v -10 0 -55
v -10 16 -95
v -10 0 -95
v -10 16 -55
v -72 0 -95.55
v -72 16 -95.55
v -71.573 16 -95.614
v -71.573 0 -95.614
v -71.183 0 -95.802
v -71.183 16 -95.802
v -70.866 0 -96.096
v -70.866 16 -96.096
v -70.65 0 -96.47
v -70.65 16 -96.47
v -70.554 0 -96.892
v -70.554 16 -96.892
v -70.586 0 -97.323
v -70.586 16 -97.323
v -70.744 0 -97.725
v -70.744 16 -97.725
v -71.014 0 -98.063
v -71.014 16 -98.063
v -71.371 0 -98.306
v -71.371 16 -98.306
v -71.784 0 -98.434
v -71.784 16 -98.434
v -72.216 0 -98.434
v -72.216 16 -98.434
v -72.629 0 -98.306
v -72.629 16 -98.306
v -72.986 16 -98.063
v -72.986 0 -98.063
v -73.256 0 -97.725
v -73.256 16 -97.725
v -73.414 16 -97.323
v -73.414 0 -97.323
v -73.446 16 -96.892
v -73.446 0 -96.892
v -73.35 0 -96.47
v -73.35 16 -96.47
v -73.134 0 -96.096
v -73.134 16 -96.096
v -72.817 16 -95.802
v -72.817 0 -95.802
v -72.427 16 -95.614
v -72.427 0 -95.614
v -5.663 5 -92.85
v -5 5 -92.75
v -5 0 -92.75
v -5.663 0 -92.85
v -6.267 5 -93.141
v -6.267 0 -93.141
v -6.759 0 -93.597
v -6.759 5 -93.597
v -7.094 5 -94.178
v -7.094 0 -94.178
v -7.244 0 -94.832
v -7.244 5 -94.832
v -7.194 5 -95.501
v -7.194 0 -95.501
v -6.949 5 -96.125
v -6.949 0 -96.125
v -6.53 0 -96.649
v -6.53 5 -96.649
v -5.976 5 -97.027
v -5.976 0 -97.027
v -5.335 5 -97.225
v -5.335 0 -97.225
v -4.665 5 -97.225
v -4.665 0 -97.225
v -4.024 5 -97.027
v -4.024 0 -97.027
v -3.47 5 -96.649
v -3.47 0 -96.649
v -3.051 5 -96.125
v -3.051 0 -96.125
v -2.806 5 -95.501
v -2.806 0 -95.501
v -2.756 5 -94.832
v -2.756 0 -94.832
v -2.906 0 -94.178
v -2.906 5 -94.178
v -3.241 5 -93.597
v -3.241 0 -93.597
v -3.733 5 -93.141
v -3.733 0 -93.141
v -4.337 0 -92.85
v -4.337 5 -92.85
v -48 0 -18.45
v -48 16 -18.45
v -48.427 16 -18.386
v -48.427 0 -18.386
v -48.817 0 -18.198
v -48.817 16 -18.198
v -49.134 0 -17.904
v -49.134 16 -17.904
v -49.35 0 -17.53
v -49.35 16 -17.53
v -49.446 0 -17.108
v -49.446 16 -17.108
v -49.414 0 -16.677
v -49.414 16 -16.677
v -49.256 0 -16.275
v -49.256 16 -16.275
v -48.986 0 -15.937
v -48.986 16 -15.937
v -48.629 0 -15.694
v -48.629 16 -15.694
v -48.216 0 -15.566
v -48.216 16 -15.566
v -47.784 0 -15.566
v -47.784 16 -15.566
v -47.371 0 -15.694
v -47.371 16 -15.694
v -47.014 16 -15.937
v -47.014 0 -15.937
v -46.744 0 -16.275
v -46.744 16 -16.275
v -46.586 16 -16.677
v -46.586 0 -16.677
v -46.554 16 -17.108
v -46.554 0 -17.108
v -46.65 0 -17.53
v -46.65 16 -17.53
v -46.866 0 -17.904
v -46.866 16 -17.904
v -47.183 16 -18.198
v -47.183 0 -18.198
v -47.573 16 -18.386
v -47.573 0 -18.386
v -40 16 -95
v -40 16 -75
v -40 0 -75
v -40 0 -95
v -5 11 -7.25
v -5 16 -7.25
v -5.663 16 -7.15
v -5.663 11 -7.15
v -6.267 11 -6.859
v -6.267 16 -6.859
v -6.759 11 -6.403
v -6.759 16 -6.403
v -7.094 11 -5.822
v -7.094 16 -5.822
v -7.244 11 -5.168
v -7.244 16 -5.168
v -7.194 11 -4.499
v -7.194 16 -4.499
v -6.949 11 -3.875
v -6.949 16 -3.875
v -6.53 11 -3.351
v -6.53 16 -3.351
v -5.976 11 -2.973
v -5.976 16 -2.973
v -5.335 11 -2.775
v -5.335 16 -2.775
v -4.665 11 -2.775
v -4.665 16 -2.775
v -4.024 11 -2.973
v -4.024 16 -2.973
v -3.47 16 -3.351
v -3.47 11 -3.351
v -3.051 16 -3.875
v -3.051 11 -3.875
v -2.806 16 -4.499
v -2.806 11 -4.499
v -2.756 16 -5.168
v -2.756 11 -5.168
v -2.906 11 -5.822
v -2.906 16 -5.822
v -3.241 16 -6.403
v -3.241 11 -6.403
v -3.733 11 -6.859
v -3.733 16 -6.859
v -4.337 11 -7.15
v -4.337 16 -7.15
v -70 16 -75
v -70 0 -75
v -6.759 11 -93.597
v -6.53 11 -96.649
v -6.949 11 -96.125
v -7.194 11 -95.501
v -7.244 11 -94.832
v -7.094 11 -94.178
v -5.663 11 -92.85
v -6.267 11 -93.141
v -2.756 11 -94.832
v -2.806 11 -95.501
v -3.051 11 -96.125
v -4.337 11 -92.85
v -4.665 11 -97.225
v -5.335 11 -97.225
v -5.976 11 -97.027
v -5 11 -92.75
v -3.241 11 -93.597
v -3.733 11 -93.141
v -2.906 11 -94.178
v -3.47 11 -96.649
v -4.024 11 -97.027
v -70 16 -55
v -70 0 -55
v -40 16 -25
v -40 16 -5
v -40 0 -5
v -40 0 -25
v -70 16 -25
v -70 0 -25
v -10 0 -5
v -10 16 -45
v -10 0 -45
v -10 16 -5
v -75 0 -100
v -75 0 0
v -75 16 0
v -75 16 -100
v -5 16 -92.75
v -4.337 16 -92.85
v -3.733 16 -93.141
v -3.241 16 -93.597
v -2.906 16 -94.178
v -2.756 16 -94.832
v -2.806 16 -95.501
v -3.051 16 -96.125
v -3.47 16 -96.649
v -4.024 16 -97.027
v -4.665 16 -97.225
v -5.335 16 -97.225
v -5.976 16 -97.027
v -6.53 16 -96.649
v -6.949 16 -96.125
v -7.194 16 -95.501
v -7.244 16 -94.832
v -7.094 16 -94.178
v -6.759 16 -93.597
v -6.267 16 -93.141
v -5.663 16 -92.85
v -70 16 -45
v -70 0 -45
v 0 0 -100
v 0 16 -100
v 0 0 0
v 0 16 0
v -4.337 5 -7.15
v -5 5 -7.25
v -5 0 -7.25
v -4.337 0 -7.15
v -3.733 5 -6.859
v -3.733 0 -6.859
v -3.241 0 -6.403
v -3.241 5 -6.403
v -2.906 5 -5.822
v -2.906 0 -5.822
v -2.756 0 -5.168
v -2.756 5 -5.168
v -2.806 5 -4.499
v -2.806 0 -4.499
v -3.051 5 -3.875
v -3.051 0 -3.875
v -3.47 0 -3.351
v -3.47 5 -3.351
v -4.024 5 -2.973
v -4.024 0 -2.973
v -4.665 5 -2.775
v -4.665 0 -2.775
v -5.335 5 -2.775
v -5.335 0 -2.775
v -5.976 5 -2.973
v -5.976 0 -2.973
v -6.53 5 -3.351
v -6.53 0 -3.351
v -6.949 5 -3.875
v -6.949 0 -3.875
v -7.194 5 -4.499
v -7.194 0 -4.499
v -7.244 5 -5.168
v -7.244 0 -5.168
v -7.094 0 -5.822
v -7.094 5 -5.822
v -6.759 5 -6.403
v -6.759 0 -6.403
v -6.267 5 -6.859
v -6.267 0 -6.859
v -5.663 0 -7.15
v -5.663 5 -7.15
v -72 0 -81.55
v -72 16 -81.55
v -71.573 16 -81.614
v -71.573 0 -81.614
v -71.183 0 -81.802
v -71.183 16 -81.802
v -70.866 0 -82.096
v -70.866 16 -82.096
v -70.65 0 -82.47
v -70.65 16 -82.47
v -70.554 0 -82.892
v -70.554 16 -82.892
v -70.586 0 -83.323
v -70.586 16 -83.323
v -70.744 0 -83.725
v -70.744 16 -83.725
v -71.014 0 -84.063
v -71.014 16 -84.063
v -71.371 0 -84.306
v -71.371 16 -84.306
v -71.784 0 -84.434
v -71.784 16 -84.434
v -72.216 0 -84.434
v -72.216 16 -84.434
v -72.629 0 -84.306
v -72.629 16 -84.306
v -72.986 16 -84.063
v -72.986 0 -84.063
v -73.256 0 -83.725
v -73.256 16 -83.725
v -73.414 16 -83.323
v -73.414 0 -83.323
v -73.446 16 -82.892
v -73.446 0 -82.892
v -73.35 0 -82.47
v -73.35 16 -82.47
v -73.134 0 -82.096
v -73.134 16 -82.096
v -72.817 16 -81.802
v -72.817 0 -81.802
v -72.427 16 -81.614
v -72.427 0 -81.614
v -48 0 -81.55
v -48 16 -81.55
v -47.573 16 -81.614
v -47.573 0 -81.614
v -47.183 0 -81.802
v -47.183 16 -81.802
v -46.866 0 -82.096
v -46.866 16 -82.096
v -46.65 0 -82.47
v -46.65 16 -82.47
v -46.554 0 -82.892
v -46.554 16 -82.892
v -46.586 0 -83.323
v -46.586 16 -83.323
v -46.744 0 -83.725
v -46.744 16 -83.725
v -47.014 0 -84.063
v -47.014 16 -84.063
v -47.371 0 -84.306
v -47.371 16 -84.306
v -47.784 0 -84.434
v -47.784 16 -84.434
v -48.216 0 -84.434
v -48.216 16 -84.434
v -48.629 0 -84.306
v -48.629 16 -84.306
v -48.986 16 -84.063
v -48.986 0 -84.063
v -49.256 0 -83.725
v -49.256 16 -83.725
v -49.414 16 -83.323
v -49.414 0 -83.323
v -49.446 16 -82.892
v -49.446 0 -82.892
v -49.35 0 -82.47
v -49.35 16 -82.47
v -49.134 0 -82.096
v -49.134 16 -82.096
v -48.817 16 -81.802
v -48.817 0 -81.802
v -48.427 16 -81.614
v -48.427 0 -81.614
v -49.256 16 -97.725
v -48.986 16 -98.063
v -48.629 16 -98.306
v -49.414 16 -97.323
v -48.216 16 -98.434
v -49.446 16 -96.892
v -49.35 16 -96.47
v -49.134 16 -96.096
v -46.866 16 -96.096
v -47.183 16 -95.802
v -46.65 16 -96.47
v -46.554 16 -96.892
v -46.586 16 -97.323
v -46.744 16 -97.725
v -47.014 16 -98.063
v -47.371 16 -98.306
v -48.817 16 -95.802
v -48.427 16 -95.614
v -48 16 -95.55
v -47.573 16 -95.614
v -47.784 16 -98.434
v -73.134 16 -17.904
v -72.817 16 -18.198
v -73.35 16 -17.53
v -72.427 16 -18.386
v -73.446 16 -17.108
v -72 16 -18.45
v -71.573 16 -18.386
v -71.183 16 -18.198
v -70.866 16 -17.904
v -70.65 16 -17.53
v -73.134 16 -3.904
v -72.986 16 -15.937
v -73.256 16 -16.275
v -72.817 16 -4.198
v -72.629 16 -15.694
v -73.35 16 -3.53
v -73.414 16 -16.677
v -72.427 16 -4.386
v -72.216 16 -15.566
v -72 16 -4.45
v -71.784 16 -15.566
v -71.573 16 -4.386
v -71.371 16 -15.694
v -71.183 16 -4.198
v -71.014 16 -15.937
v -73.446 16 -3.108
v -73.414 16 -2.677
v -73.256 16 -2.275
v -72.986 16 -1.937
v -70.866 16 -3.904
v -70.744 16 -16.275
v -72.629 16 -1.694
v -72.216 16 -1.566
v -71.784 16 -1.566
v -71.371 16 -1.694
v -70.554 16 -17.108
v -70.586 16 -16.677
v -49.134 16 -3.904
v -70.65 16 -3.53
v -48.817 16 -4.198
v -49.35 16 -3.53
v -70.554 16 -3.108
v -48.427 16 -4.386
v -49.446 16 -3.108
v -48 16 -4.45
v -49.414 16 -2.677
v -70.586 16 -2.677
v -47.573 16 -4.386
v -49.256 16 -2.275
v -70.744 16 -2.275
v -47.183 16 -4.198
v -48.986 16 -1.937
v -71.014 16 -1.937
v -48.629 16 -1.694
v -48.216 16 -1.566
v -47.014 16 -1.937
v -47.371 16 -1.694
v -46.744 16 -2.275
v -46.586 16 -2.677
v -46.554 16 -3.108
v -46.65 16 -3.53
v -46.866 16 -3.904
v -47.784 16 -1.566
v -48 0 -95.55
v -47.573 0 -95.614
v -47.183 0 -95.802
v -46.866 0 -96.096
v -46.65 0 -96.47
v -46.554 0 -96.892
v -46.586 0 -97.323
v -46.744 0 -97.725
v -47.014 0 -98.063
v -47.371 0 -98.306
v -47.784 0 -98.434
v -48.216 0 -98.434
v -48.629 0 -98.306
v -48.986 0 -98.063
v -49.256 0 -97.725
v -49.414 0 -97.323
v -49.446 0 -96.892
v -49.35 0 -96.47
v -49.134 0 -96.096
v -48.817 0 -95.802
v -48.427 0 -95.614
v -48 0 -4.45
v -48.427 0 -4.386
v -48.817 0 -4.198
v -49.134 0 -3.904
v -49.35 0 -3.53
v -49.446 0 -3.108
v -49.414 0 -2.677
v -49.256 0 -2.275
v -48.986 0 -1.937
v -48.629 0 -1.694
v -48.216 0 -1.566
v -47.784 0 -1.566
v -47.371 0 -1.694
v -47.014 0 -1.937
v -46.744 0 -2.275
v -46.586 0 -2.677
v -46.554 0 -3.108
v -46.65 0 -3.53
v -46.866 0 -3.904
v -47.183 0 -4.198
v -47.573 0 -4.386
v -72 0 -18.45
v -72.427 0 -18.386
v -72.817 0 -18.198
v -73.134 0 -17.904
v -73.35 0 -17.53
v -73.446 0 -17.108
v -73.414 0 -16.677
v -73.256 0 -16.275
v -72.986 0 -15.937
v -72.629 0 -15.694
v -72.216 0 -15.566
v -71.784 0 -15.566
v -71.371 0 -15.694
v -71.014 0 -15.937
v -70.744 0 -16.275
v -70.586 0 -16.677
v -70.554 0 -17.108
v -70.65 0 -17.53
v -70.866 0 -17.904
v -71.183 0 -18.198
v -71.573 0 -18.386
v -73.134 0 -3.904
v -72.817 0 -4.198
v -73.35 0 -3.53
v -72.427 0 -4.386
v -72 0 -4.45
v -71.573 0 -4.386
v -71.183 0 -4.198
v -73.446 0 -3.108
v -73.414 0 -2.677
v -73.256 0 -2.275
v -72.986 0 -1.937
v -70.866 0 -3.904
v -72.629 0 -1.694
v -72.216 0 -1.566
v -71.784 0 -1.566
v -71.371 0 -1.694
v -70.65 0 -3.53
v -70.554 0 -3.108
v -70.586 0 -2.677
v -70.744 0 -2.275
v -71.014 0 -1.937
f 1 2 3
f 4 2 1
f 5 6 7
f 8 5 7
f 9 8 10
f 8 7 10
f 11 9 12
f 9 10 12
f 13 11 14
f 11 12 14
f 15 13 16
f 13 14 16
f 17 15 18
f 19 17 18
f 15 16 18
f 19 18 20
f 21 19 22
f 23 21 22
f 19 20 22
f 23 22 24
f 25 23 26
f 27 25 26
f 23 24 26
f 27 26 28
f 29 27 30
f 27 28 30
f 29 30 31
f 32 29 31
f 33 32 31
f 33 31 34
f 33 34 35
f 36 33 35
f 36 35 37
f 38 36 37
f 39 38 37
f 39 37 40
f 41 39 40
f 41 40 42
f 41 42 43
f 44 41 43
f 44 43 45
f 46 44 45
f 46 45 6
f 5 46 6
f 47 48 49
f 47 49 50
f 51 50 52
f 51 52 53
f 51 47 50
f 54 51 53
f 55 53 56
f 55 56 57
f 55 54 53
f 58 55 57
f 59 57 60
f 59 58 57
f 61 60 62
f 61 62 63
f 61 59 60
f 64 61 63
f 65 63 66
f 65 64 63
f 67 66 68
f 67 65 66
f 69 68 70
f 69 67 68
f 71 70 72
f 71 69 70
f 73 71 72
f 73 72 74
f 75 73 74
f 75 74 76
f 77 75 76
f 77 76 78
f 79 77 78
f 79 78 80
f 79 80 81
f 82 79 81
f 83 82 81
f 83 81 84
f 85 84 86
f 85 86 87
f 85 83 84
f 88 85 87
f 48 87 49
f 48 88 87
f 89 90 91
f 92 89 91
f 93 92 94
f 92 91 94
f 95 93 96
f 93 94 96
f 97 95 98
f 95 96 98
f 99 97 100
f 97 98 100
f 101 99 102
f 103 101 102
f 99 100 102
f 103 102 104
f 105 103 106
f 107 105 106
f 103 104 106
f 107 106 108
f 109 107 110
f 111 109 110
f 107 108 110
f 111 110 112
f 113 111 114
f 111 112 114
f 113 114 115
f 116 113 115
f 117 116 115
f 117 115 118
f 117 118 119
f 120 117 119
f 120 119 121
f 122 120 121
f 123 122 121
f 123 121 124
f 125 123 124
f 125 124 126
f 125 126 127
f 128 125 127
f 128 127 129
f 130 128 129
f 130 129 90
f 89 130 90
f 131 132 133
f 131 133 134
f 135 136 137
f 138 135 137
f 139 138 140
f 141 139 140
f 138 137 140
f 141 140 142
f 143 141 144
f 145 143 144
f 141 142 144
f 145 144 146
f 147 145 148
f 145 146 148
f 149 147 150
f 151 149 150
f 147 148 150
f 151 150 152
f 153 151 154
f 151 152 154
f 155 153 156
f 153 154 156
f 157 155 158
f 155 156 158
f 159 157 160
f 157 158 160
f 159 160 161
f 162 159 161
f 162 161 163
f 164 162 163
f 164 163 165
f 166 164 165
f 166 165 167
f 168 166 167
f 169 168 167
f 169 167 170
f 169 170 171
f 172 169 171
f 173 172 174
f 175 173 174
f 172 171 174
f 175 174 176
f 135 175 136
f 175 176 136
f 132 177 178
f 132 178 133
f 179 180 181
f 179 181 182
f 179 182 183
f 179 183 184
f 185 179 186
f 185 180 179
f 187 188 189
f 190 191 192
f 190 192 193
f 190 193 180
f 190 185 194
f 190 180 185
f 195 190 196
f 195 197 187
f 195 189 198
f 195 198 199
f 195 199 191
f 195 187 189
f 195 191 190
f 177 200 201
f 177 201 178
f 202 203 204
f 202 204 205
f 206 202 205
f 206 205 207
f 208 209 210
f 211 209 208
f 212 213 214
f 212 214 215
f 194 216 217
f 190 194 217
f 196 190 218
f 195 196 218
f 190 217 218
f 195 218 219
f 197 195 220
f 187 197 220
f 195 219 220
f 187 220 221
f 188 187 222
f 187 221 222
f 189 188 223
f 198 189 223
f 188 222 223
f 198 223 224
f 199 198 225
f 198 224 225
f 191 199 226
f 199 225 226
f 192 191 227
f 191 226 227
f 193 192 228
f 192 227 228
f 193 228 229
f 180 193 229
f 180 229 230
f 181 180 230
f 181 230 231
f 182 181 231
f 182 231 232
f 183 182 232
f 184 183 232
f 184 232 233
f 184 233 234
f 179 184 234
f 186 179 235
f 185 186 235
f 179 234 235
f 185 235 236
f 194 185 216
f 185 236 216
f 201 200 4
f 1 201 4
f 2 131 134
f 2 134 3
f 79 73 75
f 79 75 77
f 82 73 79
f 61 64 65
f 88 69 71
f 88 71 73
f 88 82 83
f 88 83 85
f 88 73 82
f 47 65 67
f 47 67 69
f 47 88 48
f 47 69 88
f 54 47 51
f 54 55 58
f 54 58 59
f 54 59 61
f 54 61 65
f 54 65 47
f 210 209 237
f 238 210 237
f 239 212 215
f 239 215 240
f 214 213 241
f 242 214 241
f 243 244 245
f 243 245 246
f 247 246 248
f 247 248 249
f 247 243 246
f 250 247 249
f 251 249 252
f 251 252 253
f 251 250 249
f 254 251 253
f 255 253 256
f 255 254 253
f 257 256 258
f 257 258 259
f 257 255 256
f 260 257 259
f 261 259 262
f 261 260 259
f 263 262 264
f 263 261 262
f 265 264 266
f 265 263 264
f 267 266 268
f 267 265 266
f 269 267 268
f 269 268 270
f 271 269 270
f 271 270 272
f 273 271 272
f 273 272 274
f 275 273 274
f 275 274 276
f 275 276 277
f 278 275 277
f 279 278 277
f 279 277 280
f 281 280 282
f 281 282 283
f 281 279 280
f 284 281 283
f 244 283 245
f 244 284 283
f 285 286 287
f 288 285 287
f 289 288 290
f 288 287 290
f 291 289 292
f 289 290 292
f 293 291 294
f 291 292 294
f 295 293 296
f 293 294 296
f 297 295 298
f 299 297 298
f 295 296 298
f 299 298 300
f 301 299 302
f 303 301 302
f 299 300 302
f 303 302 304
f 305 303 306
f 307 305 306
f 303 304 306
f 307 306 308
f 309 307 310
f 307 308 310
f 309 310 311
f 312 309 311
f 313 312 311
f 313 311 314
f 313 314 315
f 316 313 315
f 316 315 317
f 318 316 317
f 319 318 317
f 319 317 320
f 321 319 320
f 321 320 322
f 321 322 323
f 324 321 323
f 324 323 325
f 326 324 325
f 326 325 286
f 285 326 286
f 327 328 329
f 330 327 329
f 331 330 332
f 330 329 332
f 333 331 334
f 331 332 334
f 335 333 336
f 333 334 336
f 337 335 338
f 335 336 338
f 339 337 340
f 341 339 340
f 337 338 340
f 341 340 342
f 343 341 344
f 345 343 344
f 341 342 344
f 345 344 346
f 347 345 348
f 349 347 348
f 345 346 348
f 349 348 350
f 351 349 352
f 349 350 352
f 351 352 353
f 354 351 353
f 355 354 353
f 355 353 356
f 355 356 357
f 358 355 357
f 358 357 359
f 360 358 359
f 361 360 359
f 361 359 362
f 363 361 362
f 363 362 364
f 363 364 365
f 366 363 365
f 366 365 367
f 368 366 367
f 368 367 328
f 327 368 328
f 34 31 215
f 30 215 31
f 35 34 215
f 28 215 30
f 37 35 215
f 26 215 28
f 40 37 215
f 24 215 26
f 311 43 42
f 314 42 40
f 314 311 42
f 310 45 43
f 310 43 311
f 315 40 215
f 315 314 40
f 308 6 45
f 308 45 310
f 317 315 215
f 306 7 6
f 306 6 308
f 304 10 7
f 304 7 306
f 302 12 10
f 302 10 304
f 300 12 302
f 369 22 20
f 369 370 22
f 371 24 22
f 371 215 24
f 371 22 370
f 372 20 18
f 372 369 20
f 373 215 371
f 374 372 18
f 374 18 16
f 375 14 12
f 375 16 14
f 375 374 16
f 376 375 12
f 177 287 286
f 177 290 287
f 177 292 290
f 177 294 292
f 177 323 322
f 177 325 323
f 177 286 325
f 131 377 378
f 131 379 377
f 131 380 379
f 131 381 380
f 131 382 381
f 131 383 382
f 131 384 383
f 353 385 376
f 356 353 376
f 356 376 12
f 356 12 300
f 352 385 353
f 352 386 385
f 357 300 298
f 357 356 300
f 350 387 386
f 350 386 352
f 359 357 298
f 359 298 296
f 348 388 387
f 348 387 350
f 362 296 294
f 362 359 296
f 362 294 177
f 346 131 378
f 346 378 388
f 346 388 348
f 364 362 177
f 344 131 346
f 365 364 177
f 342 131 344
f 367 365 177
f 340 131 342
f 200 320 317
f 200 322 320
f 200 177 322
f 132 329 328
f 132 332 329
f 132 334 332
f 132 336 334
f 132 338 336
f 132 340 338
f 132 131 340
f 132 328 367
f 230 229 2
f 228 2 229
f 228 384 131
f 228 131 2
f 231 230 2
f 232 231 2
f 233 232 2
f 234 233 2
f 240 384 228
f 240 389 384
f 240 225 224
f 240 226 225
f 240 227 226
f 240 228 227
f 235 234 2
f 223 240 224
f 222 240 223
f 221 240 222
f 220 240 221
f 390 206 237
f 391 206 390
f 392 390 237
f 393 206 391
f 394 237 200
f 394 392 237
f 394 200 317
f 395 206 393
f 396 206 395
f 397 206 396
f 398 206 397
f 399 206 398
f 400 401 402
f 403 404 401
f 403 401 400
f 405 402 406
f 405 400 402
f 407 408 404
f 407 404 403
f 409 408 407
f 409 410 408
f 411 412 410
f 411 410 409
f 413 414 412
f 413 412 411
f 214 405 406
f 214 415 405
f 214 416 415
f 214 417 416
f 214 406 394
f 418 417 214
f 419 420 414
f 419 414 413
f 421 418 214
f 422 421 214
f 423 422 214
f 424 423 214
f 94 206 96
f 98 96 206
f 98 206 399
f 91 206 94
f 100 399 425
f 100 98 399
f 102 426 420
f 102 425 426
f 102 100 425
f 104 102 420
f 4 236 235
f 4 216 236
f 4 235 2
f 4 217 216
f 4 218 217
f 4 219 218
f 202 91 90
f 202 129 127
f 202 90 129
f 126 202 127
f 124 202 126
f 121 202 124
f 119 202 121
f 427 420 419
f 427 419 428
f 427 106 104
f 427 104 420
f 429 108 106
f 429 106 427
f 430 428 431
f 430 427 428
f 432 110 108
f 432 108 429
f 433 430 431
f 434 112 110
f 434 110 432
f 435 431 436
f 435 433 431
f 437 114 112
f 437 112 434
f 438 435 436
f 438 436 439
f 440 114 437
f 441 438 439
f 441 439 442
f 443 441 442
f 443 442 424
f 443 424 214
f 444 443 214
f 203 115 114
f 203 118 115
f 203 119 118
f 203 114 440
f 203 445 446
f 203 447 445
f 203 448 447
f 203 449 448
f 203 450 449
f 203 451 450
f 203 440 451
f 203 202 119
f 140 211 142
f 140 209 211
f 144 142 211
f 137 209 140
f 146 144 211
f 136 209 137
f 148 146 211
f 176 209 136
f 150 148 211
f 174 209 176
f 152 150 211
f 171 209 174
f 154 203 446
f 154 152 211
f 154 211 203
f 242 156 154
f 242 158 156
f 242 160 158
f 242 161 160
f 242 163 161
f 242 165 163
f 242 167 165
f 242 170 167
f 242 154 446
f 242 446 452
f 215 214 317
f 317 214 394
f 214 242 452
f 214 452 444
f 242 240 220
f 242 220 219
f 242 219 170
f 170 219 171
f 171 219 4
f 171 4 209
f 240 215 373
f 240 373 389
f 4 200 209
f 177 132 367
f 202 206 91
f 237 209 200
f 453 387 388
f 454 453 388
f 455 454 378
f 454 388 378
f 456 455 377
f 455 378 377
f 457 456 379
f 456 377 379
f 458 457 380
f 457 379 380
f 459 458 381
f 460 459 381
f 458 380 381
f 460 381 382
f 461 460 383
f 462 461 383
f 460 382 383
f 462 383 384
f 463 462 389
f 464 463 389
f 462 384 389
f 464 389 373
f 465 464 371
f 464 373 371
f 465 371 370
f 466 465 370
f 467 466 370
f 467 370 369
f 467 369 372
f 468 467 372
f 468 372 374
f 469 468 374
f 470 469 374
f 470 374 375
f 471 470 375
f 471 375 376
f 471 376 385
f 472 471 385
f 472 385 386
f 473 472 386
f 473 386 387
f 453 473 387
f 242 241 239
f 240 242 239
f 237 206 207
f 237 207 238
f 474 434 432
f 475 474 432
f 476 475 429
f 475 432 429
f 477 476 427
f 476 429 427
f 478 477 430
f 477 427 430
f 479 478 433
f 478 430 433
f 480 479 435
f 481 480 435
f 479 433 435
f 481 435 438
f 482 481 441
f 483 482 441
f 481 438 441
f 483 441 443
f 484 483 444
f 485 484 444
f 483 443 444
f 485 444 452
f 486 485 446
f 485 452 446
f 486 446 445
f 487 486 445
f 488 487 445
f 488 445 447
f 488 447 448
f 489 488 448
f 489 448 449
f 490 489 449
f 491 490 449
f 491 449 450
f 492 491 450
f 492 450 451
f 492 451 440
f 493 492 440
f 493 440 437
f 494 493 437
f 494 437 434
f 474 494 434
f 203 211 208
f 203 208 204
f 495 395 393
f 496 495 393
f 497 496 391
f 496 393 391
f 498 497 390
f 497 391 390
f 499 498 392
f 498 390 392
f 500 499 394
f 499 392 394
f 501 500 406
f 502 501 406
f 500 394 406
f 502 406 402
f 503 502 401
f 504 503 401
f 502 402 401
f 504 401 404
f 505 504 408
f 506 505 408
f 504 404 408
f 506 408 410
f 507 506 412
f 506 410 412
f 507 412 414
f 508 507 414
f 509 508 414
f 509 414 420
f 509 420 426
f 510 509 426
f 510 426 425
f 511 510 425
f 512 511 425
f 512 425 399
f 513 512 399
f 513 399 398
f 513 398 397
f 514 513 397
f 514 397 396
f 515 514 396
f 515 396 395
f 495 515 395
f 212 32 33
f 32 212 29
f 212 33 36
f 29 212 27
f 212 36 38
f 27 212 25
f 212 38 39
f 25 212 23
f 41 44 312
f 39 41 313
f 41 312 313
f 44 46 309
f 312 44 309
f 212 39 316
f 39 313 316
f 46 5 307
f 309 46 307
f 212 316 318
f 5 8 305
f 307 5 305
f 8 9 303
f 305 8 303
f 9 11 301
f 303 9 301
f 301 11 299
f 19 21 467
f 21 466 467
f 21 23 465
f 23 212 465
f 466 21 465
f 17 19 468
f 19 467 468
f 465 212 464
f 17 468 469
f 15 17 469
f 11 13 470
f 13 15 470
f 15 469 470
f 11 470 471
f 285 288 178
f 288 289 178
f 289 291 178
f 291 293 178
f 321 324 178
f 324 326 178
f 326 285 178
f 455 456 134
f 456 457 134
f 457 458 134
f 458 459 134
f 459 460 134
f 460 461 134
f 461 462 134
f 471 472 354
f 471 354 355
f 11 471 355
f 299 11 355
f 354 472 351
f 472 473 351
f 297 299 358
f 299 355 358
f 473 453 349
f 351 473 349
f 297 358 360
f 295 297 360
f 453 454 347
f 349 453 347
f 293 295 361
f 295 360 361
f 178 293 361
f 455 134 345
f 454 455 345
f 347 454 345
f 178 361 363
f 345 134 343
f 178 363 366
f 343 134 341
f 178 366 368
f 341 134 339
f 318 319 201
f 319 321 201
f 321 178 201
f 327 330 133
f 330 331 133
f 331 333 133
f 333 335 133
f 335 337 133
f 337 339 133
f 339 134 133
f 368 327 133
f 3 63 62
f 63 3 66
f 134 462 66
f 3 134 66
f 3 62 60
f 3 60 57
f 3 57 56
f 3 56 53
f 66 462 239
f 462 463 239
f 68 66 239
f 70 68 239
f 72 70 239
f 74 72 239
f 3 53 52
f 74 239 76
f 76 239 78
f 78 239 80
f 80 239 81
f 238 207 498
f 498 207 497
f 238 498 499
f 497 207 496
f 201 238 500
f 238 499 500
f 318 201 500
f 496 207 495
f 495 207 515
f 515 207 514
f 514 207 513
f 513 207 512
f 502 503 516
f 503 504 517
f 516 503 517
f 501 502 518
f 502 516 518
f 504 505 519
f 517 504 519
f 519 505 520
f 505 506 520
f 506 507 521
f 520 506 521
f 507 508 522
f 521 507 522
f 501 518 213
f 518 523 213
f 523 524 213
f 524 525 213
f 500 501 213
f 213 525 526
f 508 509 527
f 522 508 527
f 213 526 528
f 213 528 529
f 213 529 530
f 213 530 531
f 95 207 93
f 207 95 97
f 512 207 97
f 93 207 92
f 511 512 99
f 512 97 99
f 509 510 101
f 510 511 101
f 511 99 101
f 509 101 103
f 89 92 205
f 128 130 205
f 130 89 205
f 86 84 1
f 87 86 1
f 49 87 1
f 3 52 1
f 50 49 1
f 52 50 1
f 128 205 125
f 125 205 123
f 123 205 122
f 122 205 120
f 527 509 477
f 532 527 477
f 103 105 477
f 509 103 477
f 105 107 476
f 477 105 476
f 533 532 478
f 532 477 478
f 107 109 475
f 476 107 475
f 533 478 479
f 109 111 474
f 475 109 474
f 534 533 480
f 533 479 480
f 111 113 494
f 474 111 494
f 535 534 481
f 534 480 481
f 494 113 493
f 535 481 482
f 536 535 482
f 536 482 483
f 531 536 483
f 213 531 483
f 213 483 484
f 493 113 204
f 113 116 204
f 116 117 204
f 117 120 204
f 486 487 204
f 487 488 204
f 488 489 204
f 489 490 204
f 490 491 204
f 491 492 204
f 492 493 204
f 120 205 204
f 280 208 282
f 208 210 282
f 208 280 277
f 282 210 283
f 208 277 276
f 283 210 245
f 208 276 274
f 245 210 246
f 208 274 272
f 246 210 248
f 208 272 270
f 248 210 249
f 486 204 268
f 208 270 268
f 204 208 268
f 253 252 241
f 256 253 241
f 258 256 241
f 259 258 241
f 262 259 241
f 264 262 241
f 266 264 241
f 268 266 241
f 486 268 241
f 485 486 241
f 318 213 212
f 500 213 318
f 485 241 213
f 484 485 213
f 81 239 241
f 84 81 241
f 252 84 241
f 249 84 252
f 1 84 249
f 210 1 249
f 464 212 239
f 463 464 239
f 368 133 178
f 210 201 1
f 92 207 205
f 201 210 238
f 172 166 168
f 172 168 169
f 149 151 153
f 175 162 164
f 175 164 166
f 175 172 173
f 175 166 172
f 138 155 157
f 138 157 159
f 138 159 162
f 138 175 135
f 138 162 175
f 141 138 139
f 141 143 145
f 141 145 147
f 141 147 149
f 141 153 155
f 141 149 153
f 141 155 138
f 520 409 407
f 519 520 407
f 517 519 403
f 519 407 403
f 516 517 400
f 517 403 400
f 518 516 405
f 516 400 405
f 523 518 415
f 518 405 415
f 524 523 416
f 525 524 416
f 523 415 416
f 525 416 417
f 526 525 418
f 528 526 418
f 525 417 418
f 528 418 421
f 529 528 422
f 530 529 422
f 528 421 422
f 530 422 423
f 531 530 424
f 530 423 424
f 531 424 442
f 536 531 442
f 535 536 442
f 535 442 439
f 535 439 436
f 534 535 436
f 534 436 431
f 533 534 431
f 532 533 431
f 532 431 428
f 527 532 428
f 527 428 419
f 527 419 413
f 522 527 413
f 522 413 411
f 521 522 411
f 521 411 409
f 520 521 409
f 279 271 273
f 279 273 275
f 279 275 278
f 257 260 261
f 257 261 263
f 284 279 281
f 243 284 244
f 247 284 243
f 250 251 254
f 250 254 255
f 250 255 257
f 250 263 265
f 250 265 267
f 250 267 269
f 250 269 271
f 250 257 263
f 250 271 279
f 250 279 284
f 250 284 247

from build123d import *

# Parameters (mm, degrees)
SKETCH_1_W          = 75
SKETCH_1_H          = 100
EXTRUDE_1_DEPTH     = 16
CUT_EXTRUDE_5_REACH = 128.02
SKETCH_8_R          = 1.45
CUT_EXTRUDE_7_DEPTH = 127.019839708
SKETCH_9_W          = 40
SKETCH_9_H          = 16
EXTRUDE_2_DEPTH     = 5
SKETCH_10_R         = 2.25
CUT_EXTRUDE_8_DEPTH = 5
CUT_EXTRUDE_START   = -5
SKETCH_11_R         = 2.25
CUT_EXTRUDE_9_DEPTH = 5


with BuildPart() as part:
    # 草图1 → 凸台-拉伸1 (new body)
    with BuildSketch(Plane(origin=(0, 0, 0), x_dir=(1, 0, 0), z_dir=(0, 1, 0))):
        with Locations((-37.5, 50)):
            Rectangle(SKETCH_1_W, SKETCH_1_H)
    extrude(amount=EXTRUDE_1_DEPTH)

    # 草图6 → 切除-拉伸5 (cut, up to next)
    with BuildSketch(Plane(origin=(0, 16, 0), x_dir=(1, 0, 0), z_dir=(0, 1, 0)), mode=Mode.PRIVATE) as cut_extrude_5_sk1:
        Polygon((-40, 45), (-5, 45), (-5, 5), (-40, 5), (-40, 25), (-70, 25), (-70, 45), align=None)
    cut_extrude_5_tool1 = extrude(cut_extrude_5_sk1.sketch, amount=-CUT_EXTRUDE_5_REACH, mode=Mode.PRIVATE) & part.part
    # 草图6 → 切除-拉伸5 (cut, up to next)
    with BuildSketch(Plane(origin=(0, 16, 0), x_dir=(1, 0, 0), z_dir=(0, 1, 0)), mode=Mode.PRIVATE) as cut_extrude_5_sk2:
        Polygon((-40, 95), (-5, 95), (-5, 55), (-40, 55), (-70, 55), (-70, 75), (-40, 75), align=None)
    cut_extrude_5_tool2 = extrude(cut_extrude_5_sk2.sketch, amount=-CUT_EXTRUDE_5_REACH, mode=Mode.PRIVATE) & part.part
    add(cut_extrude_5_tool1.solids().sort_by_distance((-32.25, 16, -28))[0], mode=Mode.SUBTRACT)
    add(cut_extrude_5_tool2.solids().sort_by_distance((-32.25, 16, -72))[0], mode=Mode.SUBTRACT)

    # 草图8 → 切除-拉伸7 (cut, through all)
    with BuildSketch(Plane(origin=(0, 16, 0), x_dir=(1, 0, 0), z_dir=(0, 1, 0))):
        with Locations(Location((-72, 97, 0), (0, 0, 270))):
            Circle(SKETCH_8_R)
        with Locations(Location((-72, 83, 0), (0, 0, 270))):
            Circle(SKETCH_8_R)
        with Locations(Location((-48, 97, 0), (0, 0, 270))):
            Circle(SKETCH_8_R)
        with Locations(Location((-48, 83, 0), (0, 0, 270))):
            Circle(SKETCH_8_R)
        with Locations(Location((-48, 17, 0), (0, 0, 90))):
            Circle(SKETCH_8_R)
        with Locations(Location((-48, 3, 0), (0, 0, 90))):
            Circle(SKETCH_8_R)
        with Locations(Location((-72, 17, 0), (0, 0, 90))):
            Circle(SKETCH_8_R)
        with Locations(Location((-72, 3, 0), (0, 0, 90))):
            Circle(SKETCH_8_R)
    extrude(amount=-CUT_EXTRUDE_7_DEPTH, mode=Mode.SUBTRACT)

    # 草图9 → 凸台-拉伸2 (add)
    with BuildSketch(Plane.ZY.offset(5)):
        with Locations((-25, 8)):
            Rectangle(SKETCH_9_W, SKETCH_9_H)
        with Locations((-75, 8)):
            Rectangle(SKETCH_9_W, SKETCH_9_H)
    extrude(amount=EXTRUDE_2_DEPTH)

    # 草图10 → 切除-拉伸8 (cut)
    with BuildSketch(Plane(origin=(0, 16, 0), x_dir=(1, 0, 0), z_dir=(0, 1, 0))):
        with Locations(Location((-5, 95, 0), (0, 0, 270))):
            Circle(SKETCH_10_R)
        with Locations(Location((-5, 5, 0), (0, 0, 90))):
            Circle(SKETCH_10_R)
    extrude(amount=-CUT_EXTRUDE_8_DEPTH, mode=Mode.SUBTRACT)

    # 草图11 → 切除-拉伸9 (cut)
    with BuildSketch(Plane.XZ.offset(CUT_EXTRUDE_START)):
        with Locations(Location((-5, -95, 0), (0, 0, 90))):
            Circle(SKETCH_11_R)
        with Locations(Location((-5, -5, 0), (0, 0, 270))):
            Circle(SKETCH_11_R)
    extrude(amount=CUT_EXTRUDE_9_DEPTH, mode=Mode.SUBTRACT)


solid = part.part
